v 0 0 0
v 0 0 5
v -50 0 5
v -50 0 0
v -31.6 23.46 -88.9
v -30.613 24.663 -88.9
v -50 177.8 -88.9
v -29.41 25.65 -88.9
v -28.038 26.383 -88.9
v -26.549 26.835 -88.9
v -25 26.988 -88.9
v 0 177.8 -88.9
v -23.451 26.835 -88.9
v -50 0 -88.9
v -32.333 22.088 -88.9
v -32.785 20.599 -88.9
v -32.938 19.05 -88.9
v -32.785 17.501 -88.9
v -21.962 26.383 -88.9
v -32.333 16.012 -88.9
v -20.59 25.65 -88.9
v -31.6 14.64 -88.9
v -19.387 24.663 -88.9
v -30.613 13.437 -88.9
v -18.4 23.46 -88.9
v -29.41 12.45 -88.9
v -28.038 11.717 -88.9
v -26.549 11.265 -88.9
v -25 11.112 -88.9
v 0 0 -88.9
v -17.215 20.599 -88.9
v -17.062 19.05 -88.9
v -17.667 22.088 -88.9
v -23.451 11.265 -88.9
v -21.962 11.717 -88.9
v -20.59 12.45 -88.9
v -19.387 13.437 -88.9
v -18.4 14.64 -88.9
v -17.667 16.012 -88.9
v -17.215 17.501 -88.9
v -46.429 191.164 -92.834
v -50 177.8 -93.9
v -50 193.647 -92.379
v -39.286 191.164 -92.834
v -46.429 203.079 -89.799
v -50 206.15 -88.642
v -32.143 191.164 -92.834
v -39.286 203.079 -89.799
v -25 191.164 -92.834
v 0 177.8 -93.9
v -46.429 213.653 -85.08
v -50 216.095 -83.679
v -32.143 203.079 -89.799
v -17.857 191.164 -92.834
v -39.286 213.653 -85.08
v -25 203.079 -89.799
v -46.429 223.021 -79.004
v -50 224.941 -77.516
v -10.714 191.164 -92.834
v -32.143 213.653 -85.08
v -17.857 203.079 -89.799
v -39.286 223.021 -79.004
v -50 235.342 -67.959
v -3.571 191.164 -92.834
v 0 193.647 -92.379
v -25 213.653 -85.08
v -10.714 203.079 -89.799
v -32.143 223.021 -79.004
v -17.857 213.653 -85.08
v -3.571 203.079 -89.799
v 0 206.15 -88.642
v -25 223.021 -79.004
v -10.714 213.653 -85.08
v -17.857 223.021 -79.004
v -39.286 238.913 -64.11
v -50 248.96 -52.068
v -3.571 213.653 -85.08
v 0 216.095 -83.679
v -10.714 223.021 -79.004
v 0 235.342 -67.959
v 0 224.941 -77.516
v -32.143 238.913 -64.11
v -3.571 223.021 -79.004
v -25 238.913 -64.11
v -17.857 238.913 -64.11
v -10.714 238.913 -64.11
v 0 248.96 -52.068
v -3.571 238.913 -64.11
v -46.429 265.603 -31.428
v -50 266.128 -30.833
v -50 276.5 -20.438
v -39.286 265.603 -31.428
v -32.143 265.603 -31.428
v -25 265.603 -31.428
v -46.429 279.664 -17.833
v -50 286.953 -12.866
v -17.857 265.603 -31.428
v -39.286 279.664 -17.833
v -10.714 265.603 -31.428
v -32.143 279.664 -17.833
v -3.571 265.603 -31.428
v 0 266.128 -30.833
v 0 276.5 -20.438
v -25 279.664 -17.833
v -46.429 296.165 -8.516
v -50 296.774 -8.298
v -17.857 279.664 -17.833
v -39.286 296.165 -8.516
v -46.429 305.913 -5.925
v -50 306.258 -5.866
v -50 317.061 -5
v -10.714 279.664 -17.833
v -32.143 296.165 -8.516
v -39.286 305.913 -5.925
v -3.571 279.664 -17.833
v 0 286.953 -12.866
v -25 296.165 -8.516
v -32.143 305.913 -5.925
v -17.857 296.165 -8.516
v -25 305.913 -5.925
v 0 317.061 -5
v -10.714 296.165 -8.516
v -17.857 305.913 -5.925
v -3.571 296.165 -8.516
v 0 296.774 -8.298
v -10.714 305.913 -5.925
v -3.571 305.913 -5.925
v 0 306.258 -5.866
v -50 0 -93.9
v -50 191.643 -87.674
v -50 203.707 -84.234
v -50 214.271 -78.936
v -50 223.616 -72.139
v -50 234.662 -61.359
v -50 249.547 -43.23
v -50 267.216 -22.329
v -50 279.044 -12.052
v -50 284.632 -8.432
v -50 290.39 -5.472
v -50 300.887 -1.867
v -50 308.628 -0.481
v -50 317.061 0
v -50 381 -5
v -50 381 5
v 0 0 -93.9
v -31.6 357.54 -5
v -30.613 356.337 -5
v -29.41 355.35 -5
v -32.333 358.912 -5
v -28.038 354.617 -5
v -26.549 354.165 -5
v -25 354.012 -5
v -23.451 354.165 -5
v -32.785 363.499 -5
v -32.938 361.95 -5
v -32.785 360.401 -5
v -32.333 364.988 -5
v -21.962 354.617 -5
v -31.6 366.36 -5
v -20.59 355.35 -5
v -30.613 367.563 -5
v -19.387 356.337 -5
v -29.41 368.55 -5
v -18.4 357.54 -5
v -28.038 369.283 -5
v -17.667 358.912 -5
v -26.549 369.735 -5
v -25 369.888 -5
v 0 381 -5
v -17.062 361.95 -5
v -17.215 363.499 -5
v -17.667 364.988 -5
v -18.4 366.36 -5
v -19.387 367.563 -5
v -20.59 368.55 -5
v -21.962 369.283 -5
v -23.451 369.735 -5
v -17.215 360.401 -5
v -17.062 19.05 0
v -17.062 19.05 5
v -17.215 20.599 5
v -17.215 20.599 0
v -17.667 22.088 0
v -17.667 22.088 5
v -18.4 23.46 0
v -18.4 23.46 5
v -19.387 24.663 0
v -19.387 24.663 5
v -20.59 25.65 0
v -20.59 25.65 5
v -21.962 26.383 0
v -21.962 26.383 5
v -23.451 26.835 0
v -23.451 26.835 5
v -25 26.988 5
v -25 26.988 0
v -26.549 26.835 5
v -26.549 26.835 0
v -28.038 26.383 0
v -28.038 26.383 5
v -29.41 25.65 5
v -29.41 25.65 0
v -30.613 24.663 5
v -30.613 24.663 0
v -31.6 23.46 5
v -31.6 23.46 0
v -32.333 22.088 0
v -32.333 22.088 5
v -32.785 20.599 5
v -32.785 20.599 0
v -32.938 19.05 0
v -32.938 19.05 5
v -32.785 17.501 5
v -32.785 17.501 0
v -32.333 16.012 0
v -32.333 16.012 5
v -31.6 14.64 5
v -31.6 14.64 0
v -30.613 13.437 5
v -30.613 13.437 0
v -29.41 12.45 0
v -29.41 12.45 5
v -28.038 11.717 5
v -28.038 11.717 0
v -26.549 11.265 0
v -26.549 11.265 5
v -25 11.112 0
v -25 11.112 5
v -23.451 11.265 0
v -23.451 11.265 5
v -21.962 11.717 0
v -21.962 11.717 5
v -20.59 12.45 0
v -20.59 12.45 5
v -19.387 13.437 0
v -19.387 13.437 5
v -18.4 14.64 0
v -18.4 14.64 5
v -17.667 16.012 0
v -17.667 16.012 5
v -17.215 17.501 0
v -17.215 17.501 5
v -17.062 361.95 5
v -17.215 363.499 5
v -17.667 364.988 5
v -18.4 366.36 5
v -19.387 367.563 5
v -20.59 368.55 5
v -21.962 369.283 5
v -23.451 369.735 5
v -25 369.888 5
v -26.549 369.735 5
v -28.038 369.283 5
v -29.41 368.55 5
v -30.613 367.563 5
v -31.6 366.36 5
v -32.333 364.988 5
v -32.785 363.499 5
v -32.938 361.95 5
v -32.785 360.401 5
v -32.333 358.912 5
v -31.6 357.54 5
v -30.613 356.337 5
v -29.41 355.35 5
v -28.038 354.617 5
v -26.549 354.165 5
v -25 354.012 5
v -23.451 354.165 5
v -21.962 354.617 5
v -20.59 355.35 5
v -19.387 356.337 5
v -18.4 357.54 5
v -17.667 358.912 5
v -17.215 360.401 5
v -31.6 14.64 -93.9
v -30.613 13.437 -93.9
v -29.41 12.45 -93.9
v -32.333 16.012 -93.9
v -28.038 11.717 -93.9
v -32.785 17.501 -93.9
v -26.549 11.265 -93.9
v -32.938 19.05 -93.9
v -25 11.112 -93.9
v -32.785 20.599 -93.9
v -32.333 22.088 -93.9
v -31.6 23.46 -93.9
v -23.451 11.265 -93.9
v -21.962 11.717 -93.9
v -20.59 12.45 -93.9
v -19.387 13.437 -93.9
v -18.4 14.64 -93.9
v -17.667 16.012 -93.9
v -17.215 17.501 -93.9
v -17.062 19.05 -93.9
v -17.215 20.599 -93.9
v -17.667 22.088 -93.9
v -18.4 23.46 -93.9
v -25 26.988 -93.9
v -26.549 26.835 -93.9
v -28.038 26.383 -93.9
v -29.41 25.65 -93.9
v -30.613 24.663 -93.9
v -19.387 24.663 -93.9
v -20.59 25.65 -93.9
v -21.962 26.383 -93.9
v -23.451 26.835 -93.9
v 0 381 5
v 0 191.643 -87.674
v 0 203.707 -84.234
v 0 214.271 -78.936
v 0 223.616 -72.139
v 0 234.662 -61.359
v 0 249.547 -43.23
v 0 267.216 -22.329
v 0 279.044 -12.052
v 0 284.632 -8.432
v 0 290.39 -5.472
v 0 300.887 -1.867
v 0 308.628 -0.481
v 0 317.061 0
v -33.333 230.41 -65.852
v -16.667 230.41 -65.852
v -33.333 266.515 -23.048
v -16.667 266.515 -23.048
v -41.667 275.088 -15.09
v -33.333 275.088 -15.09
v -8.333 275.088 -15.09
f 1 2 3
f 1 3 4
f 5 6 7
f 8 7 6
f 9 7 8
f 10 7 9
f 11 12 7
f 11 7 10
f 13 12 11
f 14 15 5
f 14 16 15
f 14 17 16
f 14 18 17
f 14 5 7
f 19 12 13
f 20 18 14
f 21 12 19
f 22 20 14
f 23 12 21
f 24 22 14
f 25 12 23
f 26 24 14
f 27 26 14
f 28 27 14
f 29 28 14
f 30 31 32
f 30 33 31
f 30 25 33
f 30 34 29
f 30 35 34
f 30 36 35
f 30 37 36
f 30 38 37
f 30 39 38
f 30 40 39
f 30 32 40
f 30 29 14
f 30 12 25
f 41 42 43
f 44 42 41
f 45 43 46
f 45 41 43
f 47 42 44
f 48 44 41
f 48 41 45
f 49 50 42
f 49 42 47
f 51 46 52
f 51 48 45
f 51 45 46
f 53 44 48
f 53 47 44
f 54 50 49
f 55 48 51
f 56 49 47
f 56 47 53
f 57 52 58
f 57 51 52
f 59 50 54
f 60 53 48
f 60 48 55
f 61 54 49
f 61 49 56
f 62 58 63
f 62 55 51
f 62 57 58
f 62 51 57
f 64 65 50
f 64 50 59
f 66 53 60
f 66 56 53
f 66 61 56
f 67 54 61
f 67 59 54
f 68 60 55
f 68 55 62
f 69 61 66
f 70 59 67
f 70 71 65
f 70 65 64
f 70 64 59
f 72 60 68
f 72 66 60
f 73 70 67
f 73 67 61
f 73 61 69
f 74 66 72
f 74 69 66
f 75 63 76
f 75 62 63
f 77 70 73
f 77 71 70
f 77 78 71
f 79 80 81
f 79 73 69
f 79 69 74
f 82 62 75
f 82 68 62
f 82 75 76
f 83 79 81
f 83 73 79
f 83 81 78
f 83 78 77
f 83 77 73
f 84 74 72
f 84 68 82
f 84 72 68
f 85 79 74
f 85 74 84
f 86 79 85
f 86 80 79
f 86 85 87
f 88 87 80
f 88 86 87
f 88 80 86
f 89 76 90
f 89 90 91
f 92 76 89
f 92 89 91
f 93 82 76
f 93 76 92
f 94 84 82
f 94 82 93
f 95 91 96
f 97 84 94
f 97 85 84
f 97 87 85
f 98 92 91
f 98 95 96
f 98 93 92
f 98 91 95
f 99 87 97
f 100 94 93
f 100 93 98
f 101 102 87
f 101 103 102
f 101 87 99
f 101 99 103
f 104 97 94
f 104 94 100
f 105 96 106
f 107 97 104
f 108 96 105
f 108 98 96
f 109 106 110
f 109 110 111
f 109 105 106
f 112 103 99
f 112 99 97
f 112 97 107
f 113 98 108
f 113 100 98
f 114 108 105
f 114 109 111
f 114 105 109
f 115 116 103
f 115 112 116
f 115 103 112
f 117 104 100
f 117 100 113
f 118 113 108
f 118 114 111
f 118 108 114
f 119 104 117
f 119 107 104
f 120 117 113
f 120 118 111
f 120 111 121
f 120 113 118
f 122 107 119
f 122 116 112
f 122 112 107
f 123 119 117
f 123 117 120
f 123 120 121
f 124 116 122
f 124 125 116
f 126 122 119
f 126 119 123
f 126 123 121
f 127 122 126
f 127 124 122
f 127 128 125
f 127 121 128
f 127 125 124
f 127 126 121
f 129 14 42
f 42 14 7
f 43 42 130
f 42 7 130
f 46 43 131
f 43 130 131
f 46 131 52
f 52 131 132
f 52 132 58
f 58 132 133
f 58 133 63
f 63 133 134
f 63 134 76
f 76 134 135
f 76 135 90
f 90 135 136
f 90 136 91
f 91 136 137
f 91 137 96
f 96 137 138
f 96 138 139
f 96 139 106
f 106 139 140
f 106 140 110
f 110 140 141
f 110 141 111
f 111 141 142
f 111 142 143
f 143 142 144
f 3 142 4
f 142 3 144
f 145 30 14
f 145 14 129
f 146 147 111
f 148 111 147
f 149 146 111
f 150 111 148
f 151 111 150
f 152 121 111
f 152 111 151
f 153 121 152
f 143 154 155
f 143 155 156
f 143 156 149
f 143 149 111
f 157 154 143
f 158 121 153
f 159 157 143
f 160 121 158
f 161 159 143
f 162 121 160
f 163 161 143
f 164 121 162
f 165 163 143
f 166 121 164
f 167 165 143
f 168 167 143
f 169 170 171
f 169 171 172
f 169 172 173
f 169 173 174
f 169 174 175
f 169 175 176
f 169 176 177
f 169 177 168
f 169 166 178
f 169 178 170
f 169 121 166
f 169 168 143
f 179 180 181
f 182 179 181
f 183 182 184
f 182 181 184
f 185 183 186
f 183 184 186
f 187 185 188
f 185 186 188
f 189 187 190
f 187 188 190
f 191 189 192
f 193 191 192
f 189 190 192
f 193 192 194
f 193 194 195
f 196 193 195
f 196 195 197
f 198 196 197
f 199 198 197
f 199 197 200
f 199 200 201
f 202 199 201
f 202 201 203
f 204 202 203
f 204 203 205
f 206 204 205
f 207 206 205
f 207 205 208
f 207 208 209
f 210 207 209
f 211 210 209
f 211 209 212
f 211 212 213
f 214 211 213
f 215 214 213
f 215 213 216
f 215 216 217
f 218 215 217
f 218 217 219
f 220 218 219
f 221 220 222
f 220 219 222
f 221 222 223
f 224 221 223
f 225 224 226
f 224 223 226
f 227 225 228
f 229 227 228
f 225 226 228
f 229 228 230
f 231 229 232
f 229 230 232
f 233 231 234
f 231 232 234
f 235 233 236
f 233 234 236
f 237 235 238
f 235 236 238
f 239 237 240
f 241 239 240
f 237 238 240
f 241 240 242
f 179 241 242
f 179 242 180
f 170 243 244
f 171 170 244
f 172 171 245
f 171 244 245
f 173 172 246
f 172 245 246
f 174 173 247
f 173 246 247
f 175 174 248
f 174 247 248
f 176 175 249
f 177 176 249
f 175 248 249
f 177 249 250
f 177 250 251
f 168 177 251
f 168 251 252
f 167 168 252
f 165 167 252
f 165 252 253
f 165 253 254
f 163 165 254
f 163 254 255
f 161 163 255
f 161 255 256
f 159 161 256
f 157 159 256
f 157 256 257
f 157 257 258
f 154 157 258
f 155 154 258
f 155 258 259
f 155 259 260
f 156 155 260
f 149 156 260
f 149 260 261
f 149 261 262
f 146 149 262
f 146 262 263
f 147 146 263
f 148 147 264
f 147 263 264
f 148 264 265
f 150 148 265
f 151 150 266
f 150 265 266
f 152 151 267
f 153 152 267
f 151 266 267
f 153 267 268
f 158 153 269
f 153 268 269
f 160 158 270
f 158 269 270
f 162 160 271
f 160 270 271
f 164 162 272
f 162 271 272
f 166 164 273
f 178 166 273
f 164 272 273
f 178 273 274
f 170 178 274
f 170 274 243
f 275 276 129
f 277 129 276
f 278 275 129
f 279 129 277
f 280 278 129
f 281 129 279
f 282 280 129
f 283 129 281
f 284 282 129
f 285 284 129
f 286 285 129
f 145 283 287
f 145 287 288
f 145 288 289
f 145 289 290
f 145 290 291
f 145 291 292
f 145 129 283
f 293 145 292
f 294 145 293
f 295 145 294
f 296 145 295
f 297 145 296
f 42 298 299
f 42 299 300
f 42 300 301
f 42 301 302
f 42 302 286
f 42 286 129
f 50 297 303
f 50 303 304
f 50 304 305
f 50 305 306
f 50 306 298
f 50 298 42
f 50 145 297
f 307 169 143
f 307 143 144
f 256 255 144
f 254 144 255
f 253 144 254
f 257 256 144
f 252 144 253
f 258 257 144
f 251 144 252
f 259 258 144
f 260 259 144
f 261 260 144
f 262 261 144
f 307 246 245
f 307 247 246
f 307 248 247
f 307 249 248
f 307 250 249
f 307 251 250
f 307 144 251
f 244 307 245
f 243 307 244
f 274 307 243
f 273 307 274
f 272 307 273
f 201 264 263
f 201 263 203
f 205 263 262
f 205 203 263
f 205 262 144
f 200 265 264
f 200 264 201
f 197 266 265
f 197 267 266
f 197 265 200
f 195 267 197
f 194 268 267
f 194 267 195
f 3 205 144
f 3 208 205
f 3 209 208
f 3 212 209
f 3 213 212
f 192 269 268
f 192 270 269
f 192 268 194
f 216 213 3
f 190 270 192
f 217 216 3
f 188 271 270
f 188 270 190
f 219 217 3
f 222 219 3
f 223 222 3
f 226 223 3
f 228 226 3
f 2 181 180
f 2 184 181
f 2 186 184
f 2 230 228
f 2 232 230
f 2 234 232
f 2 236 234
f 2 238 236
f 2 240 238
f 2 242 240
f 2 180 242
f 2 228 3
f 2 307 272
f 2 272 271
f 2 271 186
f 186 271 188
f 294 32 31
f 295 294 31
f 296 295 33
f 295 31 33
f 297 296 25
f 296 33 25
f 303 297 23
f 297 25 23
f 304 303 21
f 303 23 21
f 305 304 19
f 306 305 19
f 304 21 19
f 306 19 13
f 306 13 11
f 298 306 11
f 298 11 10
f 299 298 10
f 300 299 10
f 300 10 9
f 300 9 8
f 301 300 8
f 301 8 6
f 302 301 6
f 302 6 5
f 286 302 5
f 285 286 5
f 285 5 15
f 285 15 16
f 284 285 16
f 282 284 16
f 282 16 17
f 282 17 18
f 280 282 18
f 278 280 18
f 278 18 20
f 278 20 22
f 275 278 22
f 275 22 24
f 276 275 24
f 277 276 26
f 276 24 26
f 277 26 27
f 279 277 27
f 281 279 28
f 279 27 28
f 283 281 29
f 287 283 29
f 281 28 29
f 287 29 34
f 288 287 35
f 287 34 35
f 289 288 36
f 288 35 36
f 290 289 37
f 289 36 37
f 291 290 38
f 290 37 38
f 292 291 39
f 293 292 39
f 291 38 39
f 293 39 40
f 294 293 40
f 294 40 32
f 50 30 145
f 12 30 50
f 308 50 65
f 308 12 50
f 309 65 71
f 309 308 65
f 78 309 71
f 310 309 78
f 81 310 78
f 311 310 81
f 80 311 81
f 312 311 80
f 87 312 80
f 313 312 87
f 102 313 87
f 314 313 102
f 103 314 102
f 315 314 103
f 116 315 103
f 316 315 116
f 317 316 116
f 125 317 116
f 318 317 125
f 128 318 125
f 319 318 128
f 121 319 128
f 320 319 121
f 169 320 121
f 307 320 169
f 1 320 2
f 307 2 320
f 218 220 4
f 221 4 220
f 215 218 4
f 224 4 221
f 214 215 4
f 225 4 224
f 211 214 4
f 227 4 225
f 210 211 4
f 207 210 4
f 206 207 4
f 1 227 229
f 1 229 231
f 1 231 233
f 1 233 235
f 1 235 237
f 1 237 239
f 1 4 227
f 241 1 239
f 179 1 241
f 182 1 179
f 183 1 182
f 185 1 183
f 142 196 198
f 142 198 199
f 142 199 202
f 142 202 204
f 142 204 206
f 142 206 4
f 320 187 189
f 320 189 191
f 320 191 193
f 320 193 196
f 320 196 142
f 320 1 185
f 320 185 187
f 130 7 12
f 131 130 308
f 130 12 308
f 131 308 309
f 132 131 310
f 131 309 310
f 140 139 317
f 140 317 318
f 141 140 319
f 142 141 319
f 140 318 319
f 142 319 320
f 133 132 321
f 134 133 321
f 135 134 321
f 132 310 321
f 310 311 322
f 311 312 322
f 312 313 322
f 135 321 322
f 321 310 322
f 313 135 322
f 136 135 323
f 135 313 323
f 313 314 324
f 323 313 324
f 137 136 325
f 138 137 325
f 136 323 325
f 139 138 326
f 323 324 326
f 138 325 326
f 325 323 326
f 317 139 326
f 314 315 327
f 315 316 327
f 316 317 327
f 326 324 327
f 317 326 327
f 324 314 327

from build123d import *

# Parameters (mm, degrees)
F1_DEPTH = 50
F2_R     = 7.9375
F3_DEPTH = 98.9010001


# Not quite as in the source:
# - the dataset's text gives a spline's control points without its knots; the knots are read off the source's solid


with BuildPart() as f1:
    # F0 (on Right) → F1 (new body)
    with BuildSketch(Plane.YZ):
        Polygon((0, 5), (0, 0), (317.0611265182, 0), (381, 0), (381, 5), align=None)
        with BuildLine():
            Line((381, 0), (317.0611265182, 0))
            add(Edge.make_bspline(
                [(177.8, -88.9), (248.9784660816, -88.9), (248.9784660816, 0), (317.0611265182, 0)],
                knots=[0, 0, 0, 0, 165.2176484493, 165.2176484493, 165.2176484493, 165.2176484493], degree=3))
            Line((177.8, -88.9), (0, -88.9))
            Line((0, -88.9), (0, -93.9))
            Line((0, -93.9), (177.8, -93.9))
            add(Edge.make_bspline(
                [(177.8, -93.9), (182.5088568902, -93.9), (191.4045001846, -93.163983571), (203.303724493, -90.0815735434), (213.8561143205, -85.3057917839), (223.1918502865, -79.1733759879), (231.500279729, -72.0263439941), (241.5096982859, -61.5630106154), (252.6106670588, -47.4521159829), (263.297288811, -33.7461247303), (272.3524018342, -24.0513036385), (279.564351284, -17.6529202199), (287.3719173686, -12.3368323414), (295.9847641829, -8.2781357767), (305.6793231482, -5.6490337962), (313.0779947533, -5), (317.0611265182, -5)],
                knots=[0, 0, 0, 0, 0.0625, 0.125, 0.1875, 0.25, 0.3125, 0.375, 0.5, 0.625, 0.6875, 0.75, 0.8125, 0.875, 0.9375, 1, 1, 1, 1], degree=3))
            Line((317.0611265182, -5), (381, -5))
            Line((381, -5), (381, 0))
        make_face()
    extrude(amount=-F1_DEPTH)

    # F2 (on face) → F3 (cut, through all)
    with BuildSketch(Plane.XY.offset(5)):
        with Locations((-25, 361.95)):
            Circle(F2_R)
        with Locations((-25, 19.05)):
            Circle(F2_R)
    extrude(amount=-F3_DEPTH, mode=Mode.SUBTRACT)


solid = f1.part
